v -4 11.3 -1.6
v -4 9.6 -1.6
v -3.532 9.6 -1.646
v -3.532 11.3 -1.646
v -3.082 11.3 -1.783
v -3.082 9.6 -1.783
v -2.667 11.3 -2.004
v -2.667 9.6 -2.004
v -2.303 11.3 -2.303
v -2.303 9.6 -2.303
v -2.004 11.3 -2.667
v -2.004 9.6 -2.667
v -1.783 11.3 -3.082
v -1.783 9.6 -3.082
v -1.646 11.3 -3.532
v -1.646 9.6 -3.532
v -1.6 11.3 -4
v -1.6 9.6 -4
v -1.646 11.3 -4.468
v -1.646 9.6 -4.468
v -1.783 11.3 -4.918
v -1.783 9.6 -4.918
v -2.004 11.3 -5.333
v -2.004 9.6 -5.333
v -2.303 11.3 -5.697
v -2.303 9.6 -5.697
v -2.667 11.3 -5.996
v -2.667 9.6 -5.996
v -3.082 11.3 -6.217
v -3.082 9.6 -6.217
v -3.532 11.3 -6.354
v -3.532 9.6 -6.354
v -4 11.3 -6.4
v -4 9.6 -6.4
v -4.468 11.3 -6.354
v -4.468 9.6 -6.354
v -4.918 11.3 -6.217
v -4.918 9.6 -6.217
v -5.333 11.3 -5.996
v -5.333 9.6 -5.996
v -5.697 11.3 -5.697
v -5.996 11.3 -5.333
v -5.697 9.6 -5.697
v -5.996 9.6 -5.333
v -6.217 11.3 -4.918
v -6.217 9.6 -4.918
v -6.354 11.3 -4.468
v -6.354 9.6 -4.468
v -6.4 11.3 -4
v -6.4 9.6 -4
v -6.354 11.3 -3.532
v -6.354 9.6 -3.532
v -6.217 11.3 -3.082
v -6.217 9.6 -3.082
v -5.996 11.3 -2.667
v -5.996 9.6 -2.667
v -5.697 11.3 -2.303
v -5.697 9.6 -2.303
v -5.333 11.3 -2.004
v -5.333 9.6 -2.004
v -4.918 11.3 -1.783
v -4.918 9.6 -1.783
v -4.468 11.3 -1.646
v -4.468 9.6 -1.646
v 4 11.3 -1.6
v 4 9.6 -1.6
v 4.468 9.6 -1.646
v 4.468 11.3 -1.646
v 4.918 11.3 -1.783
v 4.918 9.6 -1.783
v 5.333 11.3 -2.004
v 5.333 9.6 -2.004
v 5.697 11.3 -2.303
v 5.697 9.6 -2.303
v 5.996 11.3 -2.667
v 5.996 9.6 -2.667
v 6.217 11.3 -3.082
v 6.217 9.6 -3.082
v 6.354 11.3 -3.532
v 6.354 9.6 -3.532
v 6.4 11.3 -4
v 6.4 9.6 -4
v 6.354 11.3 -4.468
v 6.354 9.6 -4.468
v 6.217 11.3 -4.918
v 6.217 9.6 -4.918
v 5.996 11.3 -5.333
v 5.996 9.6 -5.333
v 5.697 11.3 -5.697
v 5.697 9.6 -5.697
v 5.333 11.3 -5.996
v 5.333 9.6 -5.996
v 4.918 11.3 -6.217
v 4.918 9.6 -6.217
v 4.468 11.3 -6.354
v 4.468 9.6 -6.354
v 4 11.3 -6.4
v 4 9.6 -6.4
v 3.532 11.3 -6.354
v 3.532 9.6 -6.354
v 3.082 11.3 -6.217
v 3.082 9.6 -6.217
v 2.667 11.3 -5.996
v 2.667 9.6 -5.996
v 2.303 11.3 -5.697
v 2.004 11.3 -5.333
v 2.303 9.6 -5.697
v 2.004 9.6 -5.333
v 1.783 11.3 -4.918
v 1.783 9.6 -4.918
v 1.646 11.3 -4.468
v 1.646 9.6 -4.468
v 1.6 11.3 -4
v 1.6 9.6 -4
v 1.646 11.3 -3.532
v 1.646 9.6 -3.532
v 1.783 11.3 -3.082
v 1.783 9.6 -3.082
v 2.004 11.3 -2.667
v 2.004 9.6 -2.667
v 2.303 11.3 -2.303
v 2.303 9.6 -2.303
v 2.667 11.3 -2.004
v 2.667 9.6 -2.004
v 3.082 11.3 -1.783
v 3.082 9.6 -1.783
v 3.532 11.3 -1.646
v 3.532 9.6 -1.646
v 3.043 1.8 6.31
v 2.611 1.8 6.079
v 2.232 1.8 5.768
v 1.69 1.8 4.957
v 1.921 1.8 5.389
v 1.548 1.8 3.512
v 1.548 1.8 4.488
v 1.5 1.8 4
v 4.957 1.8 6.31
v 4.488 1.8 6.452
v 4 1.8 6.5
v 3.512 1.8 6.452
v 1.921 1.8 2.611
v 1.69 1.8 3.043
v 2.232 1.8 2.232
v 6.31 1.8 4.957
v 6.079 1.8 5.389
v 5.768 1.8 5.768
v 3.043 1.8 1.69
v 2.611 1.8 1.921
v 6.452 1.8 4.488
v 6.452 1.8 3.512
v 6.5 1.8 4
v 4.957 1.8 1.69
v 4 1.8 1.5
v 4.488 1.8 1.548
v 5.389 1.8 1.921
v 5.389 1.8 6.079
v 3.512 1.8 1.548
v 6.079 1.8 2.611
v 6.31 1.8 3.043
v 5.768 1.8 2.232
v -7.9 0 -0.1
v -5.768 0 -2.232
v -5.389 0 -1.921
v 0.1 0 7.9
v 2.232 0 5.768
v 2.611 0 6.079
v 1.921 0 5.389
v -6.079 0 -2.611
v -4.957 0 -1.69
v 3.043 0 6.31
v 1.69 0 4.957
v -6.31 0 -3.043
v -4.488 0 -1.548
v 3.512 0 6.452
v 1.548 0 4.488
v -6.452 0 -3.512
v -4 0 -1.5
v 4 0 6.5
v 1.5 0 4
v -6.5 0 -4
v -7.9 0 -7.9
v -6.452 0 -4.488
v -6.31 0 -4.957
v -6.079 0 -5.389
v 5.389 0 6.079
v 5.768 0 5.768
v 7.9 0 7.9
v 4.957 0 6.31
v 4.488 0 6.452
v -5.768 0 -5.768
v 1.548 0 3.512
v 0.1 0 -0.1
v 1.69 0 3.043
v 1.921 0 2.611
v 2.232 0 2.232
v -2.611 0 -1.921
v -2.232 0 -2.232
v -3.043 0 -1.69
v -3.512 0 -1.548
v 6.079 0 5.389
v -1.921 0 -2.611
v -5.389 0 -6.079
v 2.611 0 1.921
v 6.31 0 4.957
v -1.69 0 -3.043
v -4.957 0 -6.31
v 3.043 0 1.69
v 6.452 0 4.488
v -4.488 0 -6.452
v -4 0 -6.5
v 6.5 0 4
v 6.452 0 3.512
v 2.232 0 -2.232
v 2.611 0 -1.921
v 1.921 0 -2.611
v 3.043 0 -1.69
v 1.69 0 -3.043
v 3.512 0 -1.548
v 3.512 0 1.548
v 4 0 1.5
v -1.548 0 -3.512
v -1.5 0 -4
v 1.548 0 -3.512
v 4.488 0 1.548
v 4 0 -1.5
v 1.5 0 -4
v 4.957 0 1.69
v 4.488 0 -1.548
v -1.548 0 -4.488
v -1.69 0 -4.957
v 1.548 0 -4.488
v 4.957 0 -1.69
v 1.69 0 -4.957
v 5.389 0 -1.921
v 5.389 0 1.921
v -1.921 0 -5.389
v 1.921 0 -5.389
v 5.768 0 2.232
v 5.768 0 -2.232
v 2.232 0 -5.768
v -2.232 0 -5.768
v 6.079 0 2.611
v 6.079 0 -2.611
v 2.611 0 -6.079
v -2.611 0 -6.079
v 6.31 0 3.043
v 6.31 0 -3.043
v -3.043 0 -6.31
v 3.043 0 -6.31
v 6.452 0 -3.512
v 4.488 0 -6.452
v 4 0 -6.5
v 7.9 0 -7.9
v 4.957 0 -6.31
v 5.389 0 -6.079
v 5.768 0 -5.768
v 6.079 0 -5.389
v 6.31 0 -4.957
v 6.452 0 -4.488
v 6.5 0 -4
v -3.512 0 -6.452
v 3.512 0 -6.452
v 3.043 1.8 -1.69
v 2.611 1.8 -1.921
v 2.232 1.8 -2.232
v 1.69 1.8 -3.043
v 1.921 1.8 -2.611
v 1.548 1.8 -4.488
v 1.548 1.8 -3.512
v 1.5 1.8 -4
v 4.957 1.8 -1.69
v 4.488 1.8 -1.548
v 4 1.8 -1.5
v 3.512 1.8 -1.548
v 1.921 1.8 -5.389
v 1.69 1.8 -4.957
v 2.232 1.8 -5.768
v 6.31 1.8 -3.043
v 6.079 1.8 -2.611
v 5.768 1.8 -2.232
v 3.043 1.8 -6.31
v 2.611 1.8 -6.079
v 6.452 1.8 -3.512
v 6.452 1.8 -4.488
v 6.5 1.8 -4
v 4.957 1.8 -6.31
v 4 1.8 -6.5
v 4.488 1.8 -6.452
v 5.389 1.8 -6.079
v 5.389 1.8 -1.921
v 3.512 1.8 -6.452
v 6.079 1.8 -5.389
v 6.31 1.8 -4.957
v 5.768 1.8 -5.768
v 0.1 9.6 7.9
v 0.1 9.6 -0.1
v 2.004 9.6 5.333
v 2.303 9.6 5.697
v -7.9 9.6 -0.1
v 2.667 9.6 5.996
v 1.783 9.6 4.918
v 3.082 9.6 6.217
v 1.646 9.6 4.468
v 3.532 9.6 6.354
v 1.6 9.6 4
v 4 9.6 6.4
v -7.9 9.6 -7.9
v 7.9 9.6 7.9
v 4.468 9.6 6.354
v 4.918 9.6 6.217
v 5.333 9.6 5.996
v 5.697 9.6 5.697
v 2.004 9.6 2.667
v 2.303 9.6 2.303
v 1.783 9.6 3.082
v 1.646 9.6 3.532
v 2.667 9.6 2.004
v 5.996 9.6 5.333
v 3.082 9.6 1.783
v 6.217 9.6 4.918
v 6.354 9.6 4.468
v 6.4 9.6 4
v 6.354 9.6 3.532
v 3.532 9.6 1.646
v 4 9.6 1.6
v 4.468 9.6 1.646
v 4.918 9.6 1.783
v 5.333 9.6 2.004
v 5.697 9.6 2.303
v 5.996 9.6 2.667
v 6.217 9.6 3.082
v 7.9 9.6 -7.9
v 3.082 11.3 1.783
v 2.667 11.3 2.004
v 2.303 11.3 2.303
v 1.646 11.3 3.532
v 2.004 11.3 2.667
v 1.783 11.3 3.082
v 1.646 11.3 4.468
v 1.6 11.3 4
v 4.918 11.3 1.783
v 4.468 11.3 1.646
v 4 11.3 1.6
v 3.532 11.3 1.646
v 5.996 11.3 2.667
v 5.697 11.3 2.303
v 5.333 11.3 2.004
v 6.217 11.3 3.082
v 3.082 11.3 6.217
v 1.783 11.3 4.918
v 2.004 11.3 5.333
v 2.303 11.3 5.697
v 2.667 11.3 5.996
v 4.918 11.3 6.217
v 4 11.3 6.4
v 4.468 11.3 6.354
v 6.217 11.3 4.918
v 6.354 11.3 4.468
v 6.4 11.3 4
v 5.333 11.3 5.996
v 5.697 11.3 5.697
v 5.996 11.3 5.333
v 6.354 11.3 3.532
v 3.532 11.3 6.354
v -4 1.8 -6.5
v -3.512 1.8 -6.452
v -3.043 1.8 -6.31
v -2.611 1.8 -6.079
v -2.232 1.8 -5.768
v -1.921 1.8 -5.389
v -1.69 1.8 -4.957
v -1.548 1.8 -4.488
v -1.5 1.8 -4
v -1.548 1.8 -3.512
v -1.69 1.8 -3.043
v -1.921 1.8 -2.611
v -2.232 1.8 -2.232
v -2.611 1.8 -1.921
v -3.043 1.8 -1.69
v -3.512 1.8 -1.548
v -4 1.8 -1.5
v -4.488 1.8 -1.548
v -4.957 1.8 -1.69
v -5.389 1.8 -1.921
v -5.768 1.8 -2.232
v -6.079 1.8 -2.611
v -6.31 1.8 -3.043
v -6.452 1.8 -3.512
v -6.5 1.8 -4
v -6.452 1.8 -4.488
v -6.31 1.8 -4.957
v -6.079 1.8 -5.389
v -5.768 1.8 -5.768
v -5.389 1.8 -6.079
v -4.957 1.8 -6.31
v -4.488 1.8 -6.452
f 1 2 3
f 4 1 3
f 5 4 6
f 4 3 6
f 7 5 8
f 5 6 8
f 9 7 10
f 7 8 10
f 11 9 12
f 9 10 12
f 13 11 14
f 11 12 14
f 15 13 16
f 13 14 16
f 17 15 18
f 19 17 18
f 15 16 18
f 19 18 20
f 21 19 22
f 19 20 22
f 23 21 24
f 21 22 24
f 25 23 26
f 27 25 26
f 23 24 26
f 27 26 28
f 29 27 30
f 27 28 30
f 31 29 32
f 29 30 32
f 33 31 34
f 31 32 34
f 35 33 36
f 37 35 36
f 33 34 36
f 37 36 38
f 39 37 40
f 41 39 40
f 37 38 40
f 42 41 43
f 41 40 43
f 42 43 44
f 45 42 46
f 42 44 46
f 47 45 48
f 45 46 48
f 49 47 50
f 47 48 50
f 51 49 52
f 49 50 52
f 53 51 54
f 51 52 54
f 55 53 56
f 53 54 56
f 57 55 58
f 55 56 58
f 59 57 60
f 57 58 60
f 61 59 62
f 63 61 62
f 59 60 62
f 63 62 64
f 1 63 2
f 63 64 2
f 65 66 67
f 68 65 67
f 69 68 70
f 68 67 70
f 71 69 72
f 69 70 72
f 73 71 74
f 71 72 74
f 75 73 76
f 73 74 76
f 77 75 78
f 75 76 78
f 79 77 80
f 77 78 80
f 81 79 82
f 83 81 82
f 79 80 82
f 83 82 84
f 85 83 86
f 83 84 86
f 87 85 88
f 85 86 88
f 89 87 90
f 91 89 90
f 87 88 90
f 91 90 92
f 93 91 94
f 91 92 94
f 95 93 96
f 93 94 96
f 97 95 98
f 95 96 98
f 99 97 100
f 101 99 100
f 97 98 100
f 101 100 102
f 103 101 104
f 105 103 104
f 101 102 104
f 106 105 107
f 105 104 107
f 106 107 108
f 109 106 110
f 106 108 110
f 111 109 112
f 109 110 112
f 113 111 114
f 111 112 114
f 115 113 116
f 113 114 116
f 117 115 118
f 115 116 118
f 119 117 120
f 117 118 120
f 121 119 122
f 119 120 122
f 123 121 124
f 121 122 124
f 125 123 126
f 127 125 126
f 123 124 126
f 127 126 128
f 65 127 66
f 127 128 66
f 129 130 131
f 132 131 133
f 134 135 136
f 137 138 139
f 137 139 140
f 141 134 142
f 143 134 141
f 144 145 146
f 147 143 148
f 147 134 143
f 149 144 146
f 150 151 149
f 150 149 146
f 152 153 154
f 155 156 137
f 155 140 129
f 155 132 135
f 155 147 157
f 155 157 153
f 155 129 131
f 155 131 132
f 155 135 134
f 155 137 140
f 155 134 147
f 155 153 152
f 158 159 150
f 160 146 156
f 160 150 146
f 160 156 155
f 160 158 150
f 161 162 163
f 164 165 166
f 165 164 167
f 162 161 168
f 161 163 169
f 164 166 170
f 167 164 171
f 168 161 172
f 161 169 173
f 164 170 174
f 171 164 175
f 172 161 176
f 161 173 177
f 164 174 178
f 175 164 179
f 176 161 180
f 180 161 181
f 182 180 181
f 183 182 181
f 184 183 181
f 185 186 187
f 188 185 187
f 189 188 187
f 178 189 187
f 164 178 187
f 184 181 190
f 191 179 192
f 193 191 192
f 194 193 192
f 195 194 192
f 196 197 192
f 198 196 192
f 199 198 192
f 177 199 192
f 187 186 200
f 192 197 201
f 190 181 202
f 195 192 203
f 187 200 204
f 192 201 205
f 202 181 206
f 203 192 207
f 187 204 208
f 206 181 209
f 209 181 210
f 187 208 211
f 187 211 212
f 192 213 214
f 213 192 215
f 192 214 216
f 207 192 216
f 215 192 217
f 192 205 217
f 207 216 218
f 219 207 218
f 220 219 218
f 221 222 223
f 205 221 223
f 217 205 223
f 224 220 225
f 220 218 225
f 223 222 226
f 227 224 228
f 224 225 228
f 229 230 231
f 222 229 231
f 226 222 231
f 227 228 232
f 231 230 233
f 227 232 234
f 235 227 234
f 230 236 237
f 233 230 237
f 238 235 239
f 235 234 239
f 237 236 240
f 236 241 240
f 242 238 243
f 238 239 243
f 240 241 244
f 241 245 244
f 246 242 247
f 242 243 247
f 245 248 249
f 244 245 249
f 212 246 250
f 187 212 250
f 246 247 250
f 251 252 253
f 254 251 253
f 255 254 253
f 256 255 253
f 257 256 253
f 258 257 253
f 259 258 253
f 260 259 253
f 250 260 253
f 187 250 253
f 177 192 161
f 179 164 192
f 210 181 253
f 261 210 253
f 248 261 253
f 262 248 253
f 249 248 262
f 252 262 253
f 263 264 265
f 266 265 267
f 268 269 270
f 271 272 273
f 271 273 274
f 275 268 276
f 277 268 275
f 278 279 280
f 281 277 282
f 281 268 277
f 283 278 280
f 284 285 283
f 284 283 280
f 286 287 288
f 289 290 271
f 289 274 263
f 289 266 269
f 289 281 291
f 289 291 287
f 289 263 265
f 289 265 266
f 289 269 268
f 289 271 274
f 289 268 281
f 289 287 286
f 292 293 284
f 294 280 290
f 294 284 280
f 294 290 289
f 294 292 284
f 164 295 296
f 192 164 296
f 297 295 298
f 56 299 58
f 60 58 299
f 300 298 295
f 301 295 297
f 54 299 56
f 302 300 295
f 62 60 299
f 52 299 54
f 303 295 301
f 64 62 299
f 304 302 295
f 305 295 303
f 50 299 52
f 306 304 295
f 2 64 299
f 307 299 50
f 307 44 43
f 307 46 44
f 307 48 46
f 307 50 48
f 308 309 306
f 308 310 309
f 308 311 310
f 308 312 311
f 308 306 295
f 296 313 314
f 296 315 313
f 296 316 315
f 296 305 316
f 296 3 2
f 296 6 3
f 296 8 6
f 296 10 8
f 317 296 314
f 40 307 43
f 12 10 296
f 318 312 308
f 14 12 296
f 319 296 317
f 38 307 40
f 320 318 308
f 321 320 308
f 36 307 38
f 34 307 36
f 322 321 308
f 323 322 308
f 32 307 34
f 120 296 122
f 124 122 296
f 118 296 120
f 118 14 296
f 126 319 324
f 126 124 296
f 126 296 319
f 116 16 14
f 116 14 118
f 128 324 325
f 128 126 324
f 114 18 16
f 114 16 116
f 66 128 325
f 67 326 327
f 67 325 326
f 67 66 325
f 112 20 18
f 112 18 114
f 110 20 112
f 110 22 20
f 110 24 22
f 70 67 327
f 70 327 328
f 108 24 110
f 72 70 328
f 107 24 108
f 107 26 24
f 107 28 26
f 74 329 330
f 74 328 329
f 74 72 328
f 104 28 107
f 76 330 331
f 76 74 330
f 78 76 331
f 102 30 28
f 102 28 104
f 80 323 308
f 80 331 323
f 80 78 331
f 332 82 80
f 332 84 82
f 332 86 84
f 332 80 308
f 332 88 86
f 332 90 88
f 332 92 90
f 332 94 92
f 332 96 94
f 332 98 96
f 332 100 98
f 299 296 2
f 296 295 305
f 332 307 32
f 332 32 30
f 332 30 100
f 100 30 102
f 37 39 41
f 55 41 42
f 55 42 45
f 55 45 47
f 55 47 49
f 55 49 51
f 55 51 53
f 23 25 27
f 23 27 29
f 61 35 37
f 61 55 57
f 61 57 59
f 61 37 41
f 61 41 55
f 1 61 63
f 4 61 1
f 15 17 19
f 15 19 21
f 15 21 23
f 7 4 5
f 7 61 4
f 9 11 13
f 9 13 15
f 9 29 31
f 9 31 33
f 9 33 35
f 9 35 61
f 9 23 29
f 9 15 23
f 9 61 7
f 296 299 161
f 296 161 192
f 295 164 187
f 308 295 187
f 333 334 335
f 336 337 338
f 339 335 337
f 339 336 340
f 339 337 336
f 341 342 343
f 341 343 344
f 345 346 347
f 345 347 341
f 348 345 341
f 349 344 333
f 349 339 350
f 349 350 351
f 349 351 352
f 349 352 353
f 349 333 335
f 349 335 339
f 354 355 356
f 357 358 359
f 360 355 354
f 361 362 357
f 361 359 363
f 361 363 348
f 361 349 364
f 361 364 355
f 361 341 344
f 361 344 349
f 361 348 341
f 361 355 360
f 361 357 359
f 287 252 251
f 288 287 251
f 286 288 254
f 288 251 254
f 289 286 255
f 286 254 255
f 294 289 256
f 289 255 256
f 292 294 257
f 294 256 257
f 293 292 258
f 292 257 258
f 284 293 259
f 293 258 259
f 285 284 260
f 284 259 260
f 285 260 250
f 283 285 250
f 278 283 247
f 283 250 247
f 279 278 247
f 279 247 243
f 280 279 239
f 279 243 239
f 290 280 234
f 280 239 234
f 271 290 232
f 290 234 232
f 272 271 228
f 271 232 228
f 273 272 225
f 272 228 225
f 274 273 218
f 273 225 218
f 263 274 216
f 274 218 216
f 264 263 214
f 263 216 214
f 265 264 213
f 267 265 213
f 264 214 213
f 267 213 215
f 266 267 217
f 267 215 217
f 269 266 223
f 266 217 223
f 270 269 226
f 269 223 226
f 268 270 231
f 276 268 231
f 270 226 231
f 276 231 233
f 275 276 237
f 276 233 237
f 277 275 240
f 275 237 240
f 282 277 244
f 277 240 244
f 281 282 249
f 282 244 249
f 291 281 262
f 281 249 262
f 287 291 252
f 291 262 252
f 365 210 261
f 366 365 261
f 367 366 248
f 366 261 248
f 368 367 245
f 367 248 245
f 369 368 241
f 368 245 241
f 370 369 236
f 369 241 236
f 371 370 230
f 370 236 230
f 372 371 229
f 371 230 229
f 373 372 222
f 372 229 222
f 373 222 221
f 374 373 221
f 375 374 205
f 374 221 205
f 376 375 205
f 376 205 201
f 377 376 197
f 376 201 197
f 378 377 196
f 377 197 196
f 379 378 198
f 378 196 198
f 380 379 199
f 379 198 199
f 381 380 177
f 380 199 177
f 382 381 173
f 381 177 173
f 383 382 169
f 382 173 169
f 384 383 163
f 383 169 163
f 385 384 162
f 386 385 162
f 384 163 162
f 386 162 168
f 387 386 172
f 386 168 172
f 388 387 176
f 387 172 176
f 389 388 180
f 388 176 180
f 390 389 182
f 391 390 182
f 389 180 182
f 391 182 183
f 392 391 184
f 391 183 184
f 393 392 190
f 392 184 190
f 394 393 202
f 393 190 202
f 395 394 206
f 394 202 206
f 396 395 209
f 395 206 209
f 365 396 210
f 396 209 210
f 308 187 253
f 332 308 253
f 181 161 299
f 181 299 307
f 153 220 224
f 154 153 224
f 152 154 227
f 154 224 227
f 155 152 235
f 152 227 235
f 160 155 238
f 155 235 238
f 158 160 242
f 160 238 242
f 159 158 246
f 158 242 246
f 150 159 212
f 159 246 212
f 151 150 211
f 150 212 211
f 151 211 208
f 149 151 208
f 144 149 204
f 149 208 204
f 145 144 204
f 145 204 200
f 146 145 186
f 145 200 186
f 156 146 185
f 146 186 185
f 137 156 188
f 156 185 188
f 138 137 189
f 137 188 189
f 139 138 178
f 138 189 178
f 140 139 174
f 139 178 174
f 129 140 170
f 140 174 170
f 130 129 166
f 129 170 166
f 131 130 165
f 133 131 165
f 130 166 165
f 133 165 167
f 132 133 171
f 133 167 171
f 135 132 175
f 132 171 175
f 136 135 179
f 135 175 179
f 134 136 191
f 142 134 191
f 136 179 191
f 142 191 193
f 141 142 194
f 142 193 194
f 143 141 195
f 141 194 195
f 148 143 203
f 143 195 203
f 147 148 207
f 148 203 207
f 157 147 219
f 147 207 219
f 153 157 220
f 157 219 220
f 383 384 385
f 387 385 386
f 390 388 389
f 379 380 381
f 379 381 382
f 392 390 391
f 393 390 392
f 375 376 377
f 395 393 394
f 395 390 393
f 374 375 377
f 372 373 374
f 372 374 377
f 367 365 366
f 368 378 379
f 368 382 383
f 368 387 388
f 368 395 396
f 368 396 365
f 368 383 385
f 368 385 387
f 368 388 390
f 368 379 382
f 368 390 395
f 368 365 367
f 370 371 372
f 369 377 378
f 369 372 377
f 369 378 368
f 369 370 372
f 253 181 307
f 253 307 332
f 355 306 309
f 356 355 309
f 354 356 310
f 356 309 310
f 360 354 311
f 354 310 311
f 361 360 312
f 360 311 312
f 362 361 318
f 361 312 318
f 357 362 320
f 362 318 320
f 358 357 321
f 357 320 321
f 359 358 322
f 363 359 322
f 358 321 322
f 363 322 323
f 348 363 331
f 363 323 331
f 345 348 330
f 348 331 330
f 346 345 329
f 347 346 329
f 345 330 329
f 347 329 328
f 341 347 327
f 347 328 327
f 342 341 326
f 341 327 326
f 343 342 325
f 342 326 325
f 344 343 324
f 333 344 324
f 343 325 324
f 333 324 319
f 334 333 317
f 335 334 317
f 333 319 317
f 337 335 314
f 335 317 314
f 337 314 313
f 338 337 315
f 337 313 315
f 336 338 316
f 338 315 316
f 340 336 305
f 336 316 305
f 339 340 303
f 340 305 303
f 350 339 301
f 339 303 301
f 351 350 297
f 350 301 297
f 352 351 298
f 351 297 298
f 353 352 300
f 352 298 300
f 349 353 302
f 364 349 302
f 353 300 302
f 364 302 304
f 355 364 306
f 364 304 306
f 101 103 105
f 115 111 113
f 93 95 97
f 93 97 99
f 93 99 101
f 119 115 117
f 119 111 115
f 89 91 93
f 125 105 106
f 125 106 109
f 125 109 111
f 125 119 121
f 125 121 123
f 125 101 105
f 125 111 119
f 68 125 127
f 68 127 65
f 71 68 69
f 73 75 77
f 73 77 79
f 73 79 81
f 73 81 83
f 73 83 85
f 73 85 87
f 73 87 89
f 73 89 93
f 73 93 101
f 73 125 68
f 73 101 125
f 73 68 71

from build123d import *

# Parameters (mm, degrees)
SKETCH_2_W          = 15.8
SKETCH_2_H          = 15.8
EXTRUDE_1_DEPTH     = 9.6
SKETCH_3_W          = 8
SKETCH_3_H          = 8
CUT_EXTRUDE_1_DEPTH = 9.6
SKETCH_4_R          = 2.4
EXTRUDE_2_DEPTH     = 1.7
SKETCH_5_R          = 2.5
CUT_EXTRUDE_2_DEPTH = 1.8


with BuildPart() as part:
    # Эскиз2 → Бобышка-Вытянуть1 (new body)
    with BuildSketch(Plane(origin=(0, 0, 0), x_dir=(1, 0, 0), z_dir=(0, 1, 0))):
        Rectangle(SKETCH_2_W, SKETCH_2_H)
    extrude(amount=EXTRUDE_1_DEPTH)

    # Эскиз3 → Вырез-Вытянуть1 (cut)
    with BuildSketch(Plane(origin=(0, 9.6, 0), x_dir=(1, 0, 0), z_dir=(0, 1, 0))):
        with Locations((-3.9, -3.9)):
            Rectangle(SKETCH_3_W, SKETCH_3_H)
    extrude(amount=-CUT_EXTRUDE_1_DEPTH, mode=Mode.SUBTRACT)

    # Эскиз4 → Бобышка-Вытянуть2 (add)
    with BuildSketch(Plane(origin=(0, 9.6, 0), x_dir=(1, 0, 0), z_dir=(0, 1, 0))):
        with Locations(Location((-4, 4, 0), (0, 0, 270))):
            Circle(SKETCH_4_R)
        with Locations(Location((4, 4, 0), (0, 0, 270))):
            Circle(SKETCH_4_R)
        with Locations(Location((4, -4, 0), (0, 0, 270))):
            Circle(SKETCH_4_R)
    extrude(amount=EXTRUDE_2_DEPTH)

    # Эскиз5 → Вырез-Вытянуть2 (cut)
    with BuildSketch(Plane.XZ):
        with Locations(Location((-4, -4, 0), (0, 0, 270))):
            Circle(SKETCH_5_R)
        with Locations(Location((4, -4, 0), (0, 0, 270))):
            Circle(SKETCH_5_R)
        with Locations(Location((4, 4, 0), (0, 0, 270))):
            Circle(SKETCH_5_R)
    extrude(amount=-CUT_EXTRUDE_2_DEPTH, mode=Mode.SUBTRACT)


solid = part.part
